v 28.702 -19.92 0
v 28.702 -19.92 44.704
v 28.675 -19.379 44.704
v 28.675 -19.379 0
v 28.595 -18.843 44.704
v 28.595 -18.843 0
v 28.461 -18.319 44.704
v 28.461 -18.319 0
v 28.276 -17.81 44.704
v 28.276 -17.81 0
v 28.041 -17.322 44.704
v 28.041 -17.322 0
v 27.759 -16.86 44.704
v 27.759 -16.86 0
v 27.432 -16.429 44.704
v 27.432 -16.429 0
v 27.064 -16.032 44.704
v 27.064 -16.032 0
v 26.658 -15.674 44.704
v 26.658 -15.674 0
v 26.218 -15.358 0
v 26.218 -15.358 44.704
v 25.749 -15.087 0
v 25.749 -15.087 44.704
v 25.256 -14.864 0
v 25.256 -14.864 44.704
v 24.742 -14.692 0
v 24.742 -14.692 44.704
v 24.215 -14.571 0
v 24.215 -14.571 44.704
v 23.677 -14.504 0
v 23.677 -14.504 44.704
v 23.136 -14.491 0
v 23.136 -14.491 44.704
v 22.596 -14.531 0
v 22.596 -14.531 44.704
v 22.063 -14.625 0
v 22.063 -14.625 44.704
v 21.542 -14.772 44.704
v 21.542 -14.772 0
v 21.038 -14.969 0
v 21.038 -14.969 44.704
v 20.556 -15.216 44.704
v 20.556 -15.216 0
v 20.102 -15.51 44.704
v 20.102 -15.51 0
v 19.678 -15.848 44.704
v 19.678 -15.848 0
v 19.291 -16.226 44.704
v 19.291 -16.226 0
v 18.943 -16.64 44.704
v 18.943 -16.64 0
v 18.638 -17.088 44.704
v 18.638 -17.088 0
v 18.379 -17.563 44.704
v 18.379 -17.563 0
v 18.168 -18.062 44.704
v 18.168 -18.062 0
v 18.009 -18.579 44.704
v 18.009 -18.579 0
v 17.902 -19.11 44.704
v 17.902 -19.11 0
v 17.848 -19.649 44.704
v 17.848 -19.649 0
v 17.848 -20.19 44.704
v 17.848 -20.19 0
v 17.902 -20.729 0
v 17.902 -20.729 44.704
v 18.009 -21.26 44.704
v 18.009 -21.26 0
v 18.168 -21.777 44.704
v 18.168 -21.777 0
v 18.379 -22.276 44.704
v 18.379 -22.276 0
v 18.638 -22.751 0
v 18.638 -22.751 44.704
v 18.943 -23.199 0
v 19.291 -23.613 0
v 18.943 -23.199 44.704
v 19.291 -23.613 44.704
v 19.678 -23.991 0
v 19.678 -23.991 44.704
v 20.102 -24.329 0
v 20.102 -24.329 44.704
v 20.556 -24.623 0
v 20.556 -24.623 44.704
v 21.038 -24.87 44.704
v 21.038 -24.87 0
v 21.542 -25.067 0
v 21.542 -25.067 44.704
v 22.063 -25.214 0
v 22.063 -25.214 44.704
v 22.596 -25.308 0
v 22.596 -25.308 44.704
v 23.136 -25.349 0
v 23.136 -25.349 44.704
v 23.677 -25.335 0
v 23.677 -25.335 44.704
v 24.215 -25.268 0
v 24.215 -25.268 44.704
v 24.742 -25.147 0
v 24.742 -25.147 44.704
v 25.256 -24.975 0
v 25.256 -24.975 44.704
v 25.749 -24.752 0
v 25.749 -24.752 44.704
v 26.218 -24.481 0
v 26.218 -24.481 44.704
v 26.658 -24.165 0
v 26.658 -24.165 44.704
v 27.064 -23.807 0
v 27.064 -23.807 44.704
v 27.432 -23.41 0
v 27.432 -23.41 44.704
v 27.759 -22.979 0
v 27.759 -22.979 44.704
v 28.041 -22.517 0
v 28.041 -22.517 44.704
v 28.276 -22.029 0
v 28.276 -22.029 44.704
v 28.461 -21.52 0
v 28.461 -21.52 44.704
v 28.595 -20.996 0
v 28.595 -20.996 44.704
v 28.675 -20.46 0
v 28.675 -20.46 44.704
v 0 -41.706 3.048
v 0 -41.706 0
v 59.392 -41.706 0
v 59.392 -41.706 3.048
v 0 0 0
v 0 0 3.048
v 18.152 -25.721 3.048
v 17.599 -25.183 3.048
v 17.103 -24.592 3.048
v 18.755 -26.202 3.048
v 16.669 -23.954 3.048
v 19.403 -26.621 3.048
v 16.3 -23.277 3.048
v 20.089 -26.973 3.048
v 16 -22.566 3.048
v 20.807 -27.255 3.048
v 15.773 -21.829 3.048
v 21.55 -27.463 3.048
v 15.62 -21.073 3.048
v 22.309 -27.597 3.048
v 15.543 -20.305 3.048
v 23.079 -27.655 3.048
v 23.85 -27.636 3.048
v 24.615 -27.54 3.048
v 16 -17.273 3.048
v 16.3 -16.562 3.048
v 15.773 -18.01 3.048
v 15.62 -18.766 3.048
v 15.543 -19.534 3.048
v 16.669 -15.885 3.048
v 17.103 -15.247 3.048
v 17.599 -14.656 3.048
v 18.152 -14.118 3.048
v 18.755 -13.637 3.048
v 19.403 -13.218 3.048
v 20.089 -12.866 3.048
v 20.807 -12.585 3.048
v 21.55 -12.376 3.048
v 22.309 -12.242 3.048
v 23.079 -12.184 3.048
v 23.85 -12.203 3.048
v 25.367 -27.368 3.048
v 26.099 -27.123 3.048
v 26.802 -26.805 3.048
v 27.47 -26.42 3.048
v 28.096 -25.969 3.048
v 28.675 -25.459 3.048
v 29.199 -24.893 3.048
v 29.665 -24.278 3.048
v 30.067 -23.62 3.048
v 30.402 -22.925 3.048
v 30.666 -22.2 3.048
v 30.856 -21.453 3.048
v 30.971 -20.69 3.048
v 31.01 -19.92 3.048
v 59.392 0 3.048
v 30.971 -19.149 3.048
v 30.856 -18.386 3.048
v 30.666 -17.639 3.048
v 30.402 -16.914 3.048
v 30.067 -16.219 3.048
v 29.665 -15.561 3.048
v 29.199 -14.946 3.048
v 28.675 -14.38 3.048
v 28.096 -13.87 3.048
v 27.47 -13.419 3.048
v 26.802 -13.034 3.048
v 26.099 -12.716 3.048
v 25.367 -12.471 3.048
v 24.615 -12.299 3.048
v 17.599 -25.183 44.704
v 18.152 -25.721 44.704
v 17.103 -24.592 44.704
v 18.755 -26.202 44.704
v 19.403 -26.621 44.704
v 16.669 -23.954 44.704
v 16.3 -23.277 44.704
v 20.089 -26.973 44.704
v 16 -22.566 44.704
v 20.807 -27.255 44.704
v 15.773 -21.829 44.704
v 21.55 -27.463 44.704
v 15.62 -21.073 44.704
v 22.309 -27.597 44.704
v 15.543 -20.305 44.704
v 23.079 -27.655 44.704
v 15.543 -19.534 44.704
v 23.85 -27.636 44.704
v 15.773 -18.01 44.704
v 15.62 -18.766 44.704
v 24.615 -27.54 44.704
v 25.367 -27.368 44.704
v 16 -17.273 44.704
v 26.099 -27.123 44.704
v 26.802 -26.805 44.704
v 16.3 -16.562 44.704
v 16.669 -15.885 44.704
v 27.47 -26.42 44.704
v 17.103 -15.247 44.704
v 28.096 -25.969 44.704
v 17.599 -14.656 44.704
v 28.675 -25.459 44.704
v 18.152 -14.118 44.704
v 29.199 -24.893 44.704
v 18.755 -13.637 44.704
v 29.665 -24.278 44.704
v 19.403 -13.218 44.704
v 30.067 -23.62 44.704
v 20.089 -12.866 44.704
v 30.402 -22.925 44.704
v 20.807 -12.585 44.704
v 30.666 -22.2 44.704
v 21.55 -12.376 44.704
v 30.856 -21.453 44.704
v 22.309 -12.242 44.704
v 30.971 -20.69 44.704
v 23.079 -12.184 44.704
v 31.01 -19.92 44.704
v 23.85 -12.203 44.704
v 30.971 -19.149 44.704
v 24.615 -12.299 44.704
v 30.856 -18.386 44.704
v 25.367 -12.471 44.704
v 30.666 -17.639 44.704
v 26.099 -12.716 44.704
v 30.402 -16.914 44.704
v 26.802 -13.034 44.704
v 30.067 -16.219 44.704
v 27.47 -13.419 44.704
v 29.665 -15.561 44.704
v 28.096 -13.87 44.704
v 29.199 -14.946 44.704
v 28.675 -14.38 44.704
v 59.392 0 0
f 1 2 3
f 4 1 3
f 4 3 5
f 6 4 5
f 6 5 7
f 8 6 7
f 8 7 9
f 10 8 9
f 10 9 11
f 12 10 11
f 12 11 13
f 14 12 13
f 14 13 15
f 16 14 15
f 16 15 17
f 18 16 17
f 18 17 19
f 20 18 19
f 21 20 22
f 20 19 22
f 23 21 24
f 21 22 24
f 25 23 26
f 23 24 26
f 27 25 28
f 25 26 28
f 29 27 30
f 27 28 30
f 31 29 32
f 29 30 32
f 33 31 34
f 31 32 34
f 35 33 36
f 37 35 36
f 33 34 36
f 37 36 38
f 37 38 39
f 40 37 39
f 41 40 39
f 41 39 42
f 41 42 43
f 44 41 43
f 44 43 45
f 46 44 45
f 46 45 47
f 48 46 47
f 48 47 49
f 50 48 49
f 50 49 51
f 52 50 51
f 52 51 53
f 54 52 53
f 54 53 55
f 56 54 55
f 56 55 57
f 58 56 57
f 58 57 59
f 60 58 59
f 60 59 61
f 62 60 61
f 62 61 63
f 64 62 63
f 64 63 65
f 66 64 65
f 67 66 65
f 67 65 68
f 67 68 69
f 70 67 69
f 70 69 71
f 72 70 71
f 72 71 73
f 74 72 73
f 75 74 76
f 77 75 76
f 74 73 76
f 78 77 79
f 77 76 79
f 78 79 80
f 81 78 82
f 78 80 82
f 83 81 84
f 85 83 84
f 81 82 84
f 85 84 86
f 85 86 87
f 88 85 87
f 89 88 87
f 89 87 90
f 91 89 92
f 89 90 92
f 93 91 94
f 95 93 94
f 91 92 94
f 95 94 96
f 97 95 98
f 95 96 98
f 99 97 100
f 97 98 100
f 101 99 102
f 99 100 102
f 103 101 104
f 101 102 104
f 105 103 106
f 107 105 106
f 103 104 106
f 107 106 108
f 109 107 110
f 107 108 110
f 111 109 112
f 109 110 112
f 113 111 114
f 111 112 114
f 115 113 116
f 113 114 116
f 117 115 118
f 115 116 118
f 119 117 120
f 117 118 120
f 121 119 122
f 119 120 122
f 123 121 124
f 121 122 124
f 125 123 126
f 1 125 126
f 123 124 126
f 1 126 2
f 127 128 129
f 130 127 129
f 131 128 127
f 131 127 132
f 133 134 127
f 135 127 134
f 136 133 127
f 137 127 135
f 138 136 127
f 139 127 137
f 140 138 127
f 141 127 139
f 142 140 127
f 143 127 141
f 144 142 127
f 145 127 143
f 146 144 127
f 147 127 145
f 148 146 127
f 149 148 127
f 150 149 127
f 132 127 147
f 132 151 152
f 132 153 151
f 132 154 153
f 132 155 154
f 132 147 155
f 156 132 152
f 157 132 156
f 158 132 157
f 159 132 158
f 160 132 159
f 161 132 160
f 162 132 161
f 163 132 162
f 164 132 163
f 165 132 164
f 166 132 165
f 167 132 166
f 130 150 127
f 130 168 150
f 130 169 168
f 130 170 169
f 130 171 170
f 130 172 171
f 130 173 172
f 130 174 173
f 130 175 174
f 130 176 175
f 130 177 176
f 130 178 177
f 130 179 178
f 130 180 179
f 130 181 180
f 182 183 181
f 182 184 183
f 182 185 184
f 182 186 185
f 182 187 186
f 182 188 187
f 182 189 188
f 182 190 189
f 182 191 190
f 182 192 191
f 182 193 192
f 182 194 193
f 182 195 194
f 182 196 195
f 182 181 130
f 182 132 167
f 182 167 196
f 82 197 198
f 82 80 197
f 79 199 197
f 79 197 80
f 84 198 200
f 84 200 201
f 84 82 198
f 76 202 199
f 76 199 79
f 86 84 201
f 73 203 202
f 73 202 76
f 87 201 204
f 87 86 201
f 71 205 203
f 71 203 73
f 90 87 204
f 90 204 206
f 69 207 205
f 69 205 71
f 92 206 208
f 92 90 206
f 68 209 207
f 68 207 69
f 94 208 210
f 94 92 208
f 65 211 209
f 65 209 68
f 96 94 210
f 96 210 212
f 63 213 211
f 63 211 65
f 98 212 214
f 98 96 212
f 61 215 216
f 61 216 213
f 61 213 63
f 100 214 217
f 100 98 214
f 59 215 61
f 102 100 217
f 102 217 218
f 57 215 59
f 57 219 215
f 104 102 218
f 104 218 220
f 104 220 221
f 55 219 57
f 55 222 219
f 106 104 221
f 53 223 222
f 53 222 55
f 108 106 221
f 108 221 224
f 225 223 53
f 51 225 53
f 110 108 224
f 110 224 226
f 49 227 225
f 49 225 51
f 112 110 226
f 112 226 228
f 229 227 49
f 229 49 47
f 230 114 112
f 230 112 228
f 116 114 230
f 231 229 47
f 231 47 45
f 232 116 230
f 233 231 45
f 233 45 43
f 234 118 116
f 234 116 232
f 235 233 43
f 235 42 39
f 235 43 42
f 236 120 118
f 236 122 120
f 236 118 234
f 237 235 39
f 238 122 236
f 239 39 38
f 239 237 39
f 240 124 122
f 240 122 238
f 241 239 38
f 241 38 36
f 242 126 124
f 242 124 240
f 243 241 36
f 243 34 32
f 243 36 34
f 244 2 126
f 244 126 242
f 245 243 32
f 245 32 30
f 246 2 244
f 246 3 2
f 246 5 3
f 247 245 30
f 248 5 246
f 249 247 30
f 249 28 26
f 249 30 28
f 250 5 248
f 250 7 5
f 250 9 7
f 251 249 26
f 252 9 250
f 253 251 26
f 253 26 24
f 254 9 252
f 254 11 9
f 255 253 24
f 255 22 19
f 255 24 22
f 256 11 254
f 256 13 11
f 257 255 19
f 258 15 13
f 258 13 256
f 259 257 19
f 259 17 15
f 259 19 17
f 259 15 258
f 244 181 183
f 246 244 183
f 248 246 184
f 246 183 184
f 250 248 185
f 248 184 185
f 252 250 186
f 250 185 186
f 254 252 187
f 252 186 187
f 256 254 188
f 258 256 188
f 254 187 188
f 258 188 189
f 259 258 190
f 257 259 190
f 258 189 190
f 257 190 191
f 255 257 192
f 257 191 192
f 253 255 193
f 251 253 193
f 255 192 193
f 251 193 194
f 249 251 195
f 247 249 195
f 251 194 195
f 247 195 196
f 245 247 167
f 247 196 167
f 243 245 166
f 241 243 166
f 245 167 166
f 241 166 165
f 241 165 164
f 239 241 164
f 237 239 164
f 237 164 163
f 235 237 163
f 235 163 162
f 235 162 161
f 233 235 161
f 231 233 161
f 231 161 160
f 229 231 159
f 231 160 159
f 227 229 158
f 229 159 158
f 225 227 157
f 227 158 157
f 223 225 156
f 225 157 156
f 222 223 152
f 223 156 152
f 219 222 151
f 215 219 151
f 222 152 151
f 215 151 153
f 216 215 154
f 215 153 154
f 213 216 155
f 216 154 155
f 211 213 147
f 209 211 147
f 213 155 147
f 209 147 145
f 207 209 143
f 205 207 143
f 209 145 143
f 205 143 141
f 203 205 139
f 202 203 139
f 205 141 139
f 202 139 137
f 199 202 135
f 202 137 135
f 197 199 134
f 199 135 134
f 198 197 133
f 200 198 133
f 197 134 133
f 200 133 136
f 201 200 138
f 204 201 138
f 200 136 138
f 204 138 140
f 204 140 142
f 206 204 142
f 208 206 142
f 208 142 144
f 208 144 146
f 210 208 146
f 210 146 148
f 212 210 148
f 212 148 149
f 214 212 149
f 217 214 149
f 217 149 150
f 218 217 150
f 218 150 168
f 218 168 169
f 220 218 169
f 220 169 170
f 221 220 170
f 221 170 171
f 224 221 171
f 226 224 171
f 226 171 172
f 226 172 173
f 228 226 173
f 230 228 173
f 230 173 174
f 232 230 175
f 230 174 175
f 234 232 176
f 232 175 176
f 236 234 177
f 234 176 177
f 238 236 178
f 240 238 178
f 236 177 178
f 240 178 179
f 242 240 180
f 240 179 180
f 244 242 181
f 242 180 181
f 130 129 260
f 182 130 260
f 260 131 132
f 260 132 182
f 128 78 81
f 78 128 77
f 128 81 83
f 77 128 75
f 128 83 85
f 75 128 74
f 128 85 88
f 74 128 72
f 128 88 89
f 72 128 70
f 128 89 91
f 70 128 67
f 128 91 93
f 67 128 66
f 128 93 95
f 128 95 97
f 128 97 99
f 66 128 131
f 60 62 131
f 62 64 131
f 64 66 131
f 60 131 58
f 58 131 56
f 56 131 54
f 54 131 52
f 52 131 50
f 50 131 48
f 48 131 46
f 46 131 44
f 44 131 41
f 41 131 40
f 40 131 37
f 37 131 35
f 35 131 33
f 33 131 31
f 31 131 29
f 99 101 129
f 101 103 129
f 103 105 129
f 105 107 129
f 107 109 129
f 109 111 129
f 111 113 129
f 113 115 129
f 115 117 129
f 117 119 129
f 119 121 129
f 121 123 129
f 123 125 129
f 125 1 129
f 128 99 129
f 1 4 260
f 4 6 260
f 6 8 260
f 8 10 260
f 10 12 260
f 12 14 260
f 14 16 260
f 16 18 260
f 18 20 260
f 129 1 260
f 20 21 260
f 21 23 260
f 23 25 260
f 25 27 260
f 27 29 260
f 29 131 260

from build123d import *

# Parameters (mm, degrees)
F0_W     = 59.392195
F0_H     = 41.705828
F1_DEPTH = 3.048
F2_R     = 7.737953
F3_DEPTH = 41.656
F4_R     = 5.430673
F5_DEPTH = 50.8


with BuildPart() as f1:
    # F0 (on Top) → F1 (new body)
    with BuildSketch(Plane.XY):
        with Locations((29.696097, -20.852914)):
            Rectangle(F0_W, F0_H)
    extrude(amount=F1_DEPTH)

    # F2 (on face) → F3 (join)
    with BuildSketch(Plane.XY.offset(3.048)):
        with Locations((23.27165, -19.919522)):
            Circle(F2_R)
    extrude(amount=F3_DEPTH)

    # F4 (on face) → F5 (cut)
    with BuildSketch(Plane.XY.offset(44.704)):
        with Locations((23.27165, -19.919522)):
            Circle(F4_R)
    extrude(amount=-F5_DEPTH, mode=Mode.SUBTRACT)


solid = f1.part
